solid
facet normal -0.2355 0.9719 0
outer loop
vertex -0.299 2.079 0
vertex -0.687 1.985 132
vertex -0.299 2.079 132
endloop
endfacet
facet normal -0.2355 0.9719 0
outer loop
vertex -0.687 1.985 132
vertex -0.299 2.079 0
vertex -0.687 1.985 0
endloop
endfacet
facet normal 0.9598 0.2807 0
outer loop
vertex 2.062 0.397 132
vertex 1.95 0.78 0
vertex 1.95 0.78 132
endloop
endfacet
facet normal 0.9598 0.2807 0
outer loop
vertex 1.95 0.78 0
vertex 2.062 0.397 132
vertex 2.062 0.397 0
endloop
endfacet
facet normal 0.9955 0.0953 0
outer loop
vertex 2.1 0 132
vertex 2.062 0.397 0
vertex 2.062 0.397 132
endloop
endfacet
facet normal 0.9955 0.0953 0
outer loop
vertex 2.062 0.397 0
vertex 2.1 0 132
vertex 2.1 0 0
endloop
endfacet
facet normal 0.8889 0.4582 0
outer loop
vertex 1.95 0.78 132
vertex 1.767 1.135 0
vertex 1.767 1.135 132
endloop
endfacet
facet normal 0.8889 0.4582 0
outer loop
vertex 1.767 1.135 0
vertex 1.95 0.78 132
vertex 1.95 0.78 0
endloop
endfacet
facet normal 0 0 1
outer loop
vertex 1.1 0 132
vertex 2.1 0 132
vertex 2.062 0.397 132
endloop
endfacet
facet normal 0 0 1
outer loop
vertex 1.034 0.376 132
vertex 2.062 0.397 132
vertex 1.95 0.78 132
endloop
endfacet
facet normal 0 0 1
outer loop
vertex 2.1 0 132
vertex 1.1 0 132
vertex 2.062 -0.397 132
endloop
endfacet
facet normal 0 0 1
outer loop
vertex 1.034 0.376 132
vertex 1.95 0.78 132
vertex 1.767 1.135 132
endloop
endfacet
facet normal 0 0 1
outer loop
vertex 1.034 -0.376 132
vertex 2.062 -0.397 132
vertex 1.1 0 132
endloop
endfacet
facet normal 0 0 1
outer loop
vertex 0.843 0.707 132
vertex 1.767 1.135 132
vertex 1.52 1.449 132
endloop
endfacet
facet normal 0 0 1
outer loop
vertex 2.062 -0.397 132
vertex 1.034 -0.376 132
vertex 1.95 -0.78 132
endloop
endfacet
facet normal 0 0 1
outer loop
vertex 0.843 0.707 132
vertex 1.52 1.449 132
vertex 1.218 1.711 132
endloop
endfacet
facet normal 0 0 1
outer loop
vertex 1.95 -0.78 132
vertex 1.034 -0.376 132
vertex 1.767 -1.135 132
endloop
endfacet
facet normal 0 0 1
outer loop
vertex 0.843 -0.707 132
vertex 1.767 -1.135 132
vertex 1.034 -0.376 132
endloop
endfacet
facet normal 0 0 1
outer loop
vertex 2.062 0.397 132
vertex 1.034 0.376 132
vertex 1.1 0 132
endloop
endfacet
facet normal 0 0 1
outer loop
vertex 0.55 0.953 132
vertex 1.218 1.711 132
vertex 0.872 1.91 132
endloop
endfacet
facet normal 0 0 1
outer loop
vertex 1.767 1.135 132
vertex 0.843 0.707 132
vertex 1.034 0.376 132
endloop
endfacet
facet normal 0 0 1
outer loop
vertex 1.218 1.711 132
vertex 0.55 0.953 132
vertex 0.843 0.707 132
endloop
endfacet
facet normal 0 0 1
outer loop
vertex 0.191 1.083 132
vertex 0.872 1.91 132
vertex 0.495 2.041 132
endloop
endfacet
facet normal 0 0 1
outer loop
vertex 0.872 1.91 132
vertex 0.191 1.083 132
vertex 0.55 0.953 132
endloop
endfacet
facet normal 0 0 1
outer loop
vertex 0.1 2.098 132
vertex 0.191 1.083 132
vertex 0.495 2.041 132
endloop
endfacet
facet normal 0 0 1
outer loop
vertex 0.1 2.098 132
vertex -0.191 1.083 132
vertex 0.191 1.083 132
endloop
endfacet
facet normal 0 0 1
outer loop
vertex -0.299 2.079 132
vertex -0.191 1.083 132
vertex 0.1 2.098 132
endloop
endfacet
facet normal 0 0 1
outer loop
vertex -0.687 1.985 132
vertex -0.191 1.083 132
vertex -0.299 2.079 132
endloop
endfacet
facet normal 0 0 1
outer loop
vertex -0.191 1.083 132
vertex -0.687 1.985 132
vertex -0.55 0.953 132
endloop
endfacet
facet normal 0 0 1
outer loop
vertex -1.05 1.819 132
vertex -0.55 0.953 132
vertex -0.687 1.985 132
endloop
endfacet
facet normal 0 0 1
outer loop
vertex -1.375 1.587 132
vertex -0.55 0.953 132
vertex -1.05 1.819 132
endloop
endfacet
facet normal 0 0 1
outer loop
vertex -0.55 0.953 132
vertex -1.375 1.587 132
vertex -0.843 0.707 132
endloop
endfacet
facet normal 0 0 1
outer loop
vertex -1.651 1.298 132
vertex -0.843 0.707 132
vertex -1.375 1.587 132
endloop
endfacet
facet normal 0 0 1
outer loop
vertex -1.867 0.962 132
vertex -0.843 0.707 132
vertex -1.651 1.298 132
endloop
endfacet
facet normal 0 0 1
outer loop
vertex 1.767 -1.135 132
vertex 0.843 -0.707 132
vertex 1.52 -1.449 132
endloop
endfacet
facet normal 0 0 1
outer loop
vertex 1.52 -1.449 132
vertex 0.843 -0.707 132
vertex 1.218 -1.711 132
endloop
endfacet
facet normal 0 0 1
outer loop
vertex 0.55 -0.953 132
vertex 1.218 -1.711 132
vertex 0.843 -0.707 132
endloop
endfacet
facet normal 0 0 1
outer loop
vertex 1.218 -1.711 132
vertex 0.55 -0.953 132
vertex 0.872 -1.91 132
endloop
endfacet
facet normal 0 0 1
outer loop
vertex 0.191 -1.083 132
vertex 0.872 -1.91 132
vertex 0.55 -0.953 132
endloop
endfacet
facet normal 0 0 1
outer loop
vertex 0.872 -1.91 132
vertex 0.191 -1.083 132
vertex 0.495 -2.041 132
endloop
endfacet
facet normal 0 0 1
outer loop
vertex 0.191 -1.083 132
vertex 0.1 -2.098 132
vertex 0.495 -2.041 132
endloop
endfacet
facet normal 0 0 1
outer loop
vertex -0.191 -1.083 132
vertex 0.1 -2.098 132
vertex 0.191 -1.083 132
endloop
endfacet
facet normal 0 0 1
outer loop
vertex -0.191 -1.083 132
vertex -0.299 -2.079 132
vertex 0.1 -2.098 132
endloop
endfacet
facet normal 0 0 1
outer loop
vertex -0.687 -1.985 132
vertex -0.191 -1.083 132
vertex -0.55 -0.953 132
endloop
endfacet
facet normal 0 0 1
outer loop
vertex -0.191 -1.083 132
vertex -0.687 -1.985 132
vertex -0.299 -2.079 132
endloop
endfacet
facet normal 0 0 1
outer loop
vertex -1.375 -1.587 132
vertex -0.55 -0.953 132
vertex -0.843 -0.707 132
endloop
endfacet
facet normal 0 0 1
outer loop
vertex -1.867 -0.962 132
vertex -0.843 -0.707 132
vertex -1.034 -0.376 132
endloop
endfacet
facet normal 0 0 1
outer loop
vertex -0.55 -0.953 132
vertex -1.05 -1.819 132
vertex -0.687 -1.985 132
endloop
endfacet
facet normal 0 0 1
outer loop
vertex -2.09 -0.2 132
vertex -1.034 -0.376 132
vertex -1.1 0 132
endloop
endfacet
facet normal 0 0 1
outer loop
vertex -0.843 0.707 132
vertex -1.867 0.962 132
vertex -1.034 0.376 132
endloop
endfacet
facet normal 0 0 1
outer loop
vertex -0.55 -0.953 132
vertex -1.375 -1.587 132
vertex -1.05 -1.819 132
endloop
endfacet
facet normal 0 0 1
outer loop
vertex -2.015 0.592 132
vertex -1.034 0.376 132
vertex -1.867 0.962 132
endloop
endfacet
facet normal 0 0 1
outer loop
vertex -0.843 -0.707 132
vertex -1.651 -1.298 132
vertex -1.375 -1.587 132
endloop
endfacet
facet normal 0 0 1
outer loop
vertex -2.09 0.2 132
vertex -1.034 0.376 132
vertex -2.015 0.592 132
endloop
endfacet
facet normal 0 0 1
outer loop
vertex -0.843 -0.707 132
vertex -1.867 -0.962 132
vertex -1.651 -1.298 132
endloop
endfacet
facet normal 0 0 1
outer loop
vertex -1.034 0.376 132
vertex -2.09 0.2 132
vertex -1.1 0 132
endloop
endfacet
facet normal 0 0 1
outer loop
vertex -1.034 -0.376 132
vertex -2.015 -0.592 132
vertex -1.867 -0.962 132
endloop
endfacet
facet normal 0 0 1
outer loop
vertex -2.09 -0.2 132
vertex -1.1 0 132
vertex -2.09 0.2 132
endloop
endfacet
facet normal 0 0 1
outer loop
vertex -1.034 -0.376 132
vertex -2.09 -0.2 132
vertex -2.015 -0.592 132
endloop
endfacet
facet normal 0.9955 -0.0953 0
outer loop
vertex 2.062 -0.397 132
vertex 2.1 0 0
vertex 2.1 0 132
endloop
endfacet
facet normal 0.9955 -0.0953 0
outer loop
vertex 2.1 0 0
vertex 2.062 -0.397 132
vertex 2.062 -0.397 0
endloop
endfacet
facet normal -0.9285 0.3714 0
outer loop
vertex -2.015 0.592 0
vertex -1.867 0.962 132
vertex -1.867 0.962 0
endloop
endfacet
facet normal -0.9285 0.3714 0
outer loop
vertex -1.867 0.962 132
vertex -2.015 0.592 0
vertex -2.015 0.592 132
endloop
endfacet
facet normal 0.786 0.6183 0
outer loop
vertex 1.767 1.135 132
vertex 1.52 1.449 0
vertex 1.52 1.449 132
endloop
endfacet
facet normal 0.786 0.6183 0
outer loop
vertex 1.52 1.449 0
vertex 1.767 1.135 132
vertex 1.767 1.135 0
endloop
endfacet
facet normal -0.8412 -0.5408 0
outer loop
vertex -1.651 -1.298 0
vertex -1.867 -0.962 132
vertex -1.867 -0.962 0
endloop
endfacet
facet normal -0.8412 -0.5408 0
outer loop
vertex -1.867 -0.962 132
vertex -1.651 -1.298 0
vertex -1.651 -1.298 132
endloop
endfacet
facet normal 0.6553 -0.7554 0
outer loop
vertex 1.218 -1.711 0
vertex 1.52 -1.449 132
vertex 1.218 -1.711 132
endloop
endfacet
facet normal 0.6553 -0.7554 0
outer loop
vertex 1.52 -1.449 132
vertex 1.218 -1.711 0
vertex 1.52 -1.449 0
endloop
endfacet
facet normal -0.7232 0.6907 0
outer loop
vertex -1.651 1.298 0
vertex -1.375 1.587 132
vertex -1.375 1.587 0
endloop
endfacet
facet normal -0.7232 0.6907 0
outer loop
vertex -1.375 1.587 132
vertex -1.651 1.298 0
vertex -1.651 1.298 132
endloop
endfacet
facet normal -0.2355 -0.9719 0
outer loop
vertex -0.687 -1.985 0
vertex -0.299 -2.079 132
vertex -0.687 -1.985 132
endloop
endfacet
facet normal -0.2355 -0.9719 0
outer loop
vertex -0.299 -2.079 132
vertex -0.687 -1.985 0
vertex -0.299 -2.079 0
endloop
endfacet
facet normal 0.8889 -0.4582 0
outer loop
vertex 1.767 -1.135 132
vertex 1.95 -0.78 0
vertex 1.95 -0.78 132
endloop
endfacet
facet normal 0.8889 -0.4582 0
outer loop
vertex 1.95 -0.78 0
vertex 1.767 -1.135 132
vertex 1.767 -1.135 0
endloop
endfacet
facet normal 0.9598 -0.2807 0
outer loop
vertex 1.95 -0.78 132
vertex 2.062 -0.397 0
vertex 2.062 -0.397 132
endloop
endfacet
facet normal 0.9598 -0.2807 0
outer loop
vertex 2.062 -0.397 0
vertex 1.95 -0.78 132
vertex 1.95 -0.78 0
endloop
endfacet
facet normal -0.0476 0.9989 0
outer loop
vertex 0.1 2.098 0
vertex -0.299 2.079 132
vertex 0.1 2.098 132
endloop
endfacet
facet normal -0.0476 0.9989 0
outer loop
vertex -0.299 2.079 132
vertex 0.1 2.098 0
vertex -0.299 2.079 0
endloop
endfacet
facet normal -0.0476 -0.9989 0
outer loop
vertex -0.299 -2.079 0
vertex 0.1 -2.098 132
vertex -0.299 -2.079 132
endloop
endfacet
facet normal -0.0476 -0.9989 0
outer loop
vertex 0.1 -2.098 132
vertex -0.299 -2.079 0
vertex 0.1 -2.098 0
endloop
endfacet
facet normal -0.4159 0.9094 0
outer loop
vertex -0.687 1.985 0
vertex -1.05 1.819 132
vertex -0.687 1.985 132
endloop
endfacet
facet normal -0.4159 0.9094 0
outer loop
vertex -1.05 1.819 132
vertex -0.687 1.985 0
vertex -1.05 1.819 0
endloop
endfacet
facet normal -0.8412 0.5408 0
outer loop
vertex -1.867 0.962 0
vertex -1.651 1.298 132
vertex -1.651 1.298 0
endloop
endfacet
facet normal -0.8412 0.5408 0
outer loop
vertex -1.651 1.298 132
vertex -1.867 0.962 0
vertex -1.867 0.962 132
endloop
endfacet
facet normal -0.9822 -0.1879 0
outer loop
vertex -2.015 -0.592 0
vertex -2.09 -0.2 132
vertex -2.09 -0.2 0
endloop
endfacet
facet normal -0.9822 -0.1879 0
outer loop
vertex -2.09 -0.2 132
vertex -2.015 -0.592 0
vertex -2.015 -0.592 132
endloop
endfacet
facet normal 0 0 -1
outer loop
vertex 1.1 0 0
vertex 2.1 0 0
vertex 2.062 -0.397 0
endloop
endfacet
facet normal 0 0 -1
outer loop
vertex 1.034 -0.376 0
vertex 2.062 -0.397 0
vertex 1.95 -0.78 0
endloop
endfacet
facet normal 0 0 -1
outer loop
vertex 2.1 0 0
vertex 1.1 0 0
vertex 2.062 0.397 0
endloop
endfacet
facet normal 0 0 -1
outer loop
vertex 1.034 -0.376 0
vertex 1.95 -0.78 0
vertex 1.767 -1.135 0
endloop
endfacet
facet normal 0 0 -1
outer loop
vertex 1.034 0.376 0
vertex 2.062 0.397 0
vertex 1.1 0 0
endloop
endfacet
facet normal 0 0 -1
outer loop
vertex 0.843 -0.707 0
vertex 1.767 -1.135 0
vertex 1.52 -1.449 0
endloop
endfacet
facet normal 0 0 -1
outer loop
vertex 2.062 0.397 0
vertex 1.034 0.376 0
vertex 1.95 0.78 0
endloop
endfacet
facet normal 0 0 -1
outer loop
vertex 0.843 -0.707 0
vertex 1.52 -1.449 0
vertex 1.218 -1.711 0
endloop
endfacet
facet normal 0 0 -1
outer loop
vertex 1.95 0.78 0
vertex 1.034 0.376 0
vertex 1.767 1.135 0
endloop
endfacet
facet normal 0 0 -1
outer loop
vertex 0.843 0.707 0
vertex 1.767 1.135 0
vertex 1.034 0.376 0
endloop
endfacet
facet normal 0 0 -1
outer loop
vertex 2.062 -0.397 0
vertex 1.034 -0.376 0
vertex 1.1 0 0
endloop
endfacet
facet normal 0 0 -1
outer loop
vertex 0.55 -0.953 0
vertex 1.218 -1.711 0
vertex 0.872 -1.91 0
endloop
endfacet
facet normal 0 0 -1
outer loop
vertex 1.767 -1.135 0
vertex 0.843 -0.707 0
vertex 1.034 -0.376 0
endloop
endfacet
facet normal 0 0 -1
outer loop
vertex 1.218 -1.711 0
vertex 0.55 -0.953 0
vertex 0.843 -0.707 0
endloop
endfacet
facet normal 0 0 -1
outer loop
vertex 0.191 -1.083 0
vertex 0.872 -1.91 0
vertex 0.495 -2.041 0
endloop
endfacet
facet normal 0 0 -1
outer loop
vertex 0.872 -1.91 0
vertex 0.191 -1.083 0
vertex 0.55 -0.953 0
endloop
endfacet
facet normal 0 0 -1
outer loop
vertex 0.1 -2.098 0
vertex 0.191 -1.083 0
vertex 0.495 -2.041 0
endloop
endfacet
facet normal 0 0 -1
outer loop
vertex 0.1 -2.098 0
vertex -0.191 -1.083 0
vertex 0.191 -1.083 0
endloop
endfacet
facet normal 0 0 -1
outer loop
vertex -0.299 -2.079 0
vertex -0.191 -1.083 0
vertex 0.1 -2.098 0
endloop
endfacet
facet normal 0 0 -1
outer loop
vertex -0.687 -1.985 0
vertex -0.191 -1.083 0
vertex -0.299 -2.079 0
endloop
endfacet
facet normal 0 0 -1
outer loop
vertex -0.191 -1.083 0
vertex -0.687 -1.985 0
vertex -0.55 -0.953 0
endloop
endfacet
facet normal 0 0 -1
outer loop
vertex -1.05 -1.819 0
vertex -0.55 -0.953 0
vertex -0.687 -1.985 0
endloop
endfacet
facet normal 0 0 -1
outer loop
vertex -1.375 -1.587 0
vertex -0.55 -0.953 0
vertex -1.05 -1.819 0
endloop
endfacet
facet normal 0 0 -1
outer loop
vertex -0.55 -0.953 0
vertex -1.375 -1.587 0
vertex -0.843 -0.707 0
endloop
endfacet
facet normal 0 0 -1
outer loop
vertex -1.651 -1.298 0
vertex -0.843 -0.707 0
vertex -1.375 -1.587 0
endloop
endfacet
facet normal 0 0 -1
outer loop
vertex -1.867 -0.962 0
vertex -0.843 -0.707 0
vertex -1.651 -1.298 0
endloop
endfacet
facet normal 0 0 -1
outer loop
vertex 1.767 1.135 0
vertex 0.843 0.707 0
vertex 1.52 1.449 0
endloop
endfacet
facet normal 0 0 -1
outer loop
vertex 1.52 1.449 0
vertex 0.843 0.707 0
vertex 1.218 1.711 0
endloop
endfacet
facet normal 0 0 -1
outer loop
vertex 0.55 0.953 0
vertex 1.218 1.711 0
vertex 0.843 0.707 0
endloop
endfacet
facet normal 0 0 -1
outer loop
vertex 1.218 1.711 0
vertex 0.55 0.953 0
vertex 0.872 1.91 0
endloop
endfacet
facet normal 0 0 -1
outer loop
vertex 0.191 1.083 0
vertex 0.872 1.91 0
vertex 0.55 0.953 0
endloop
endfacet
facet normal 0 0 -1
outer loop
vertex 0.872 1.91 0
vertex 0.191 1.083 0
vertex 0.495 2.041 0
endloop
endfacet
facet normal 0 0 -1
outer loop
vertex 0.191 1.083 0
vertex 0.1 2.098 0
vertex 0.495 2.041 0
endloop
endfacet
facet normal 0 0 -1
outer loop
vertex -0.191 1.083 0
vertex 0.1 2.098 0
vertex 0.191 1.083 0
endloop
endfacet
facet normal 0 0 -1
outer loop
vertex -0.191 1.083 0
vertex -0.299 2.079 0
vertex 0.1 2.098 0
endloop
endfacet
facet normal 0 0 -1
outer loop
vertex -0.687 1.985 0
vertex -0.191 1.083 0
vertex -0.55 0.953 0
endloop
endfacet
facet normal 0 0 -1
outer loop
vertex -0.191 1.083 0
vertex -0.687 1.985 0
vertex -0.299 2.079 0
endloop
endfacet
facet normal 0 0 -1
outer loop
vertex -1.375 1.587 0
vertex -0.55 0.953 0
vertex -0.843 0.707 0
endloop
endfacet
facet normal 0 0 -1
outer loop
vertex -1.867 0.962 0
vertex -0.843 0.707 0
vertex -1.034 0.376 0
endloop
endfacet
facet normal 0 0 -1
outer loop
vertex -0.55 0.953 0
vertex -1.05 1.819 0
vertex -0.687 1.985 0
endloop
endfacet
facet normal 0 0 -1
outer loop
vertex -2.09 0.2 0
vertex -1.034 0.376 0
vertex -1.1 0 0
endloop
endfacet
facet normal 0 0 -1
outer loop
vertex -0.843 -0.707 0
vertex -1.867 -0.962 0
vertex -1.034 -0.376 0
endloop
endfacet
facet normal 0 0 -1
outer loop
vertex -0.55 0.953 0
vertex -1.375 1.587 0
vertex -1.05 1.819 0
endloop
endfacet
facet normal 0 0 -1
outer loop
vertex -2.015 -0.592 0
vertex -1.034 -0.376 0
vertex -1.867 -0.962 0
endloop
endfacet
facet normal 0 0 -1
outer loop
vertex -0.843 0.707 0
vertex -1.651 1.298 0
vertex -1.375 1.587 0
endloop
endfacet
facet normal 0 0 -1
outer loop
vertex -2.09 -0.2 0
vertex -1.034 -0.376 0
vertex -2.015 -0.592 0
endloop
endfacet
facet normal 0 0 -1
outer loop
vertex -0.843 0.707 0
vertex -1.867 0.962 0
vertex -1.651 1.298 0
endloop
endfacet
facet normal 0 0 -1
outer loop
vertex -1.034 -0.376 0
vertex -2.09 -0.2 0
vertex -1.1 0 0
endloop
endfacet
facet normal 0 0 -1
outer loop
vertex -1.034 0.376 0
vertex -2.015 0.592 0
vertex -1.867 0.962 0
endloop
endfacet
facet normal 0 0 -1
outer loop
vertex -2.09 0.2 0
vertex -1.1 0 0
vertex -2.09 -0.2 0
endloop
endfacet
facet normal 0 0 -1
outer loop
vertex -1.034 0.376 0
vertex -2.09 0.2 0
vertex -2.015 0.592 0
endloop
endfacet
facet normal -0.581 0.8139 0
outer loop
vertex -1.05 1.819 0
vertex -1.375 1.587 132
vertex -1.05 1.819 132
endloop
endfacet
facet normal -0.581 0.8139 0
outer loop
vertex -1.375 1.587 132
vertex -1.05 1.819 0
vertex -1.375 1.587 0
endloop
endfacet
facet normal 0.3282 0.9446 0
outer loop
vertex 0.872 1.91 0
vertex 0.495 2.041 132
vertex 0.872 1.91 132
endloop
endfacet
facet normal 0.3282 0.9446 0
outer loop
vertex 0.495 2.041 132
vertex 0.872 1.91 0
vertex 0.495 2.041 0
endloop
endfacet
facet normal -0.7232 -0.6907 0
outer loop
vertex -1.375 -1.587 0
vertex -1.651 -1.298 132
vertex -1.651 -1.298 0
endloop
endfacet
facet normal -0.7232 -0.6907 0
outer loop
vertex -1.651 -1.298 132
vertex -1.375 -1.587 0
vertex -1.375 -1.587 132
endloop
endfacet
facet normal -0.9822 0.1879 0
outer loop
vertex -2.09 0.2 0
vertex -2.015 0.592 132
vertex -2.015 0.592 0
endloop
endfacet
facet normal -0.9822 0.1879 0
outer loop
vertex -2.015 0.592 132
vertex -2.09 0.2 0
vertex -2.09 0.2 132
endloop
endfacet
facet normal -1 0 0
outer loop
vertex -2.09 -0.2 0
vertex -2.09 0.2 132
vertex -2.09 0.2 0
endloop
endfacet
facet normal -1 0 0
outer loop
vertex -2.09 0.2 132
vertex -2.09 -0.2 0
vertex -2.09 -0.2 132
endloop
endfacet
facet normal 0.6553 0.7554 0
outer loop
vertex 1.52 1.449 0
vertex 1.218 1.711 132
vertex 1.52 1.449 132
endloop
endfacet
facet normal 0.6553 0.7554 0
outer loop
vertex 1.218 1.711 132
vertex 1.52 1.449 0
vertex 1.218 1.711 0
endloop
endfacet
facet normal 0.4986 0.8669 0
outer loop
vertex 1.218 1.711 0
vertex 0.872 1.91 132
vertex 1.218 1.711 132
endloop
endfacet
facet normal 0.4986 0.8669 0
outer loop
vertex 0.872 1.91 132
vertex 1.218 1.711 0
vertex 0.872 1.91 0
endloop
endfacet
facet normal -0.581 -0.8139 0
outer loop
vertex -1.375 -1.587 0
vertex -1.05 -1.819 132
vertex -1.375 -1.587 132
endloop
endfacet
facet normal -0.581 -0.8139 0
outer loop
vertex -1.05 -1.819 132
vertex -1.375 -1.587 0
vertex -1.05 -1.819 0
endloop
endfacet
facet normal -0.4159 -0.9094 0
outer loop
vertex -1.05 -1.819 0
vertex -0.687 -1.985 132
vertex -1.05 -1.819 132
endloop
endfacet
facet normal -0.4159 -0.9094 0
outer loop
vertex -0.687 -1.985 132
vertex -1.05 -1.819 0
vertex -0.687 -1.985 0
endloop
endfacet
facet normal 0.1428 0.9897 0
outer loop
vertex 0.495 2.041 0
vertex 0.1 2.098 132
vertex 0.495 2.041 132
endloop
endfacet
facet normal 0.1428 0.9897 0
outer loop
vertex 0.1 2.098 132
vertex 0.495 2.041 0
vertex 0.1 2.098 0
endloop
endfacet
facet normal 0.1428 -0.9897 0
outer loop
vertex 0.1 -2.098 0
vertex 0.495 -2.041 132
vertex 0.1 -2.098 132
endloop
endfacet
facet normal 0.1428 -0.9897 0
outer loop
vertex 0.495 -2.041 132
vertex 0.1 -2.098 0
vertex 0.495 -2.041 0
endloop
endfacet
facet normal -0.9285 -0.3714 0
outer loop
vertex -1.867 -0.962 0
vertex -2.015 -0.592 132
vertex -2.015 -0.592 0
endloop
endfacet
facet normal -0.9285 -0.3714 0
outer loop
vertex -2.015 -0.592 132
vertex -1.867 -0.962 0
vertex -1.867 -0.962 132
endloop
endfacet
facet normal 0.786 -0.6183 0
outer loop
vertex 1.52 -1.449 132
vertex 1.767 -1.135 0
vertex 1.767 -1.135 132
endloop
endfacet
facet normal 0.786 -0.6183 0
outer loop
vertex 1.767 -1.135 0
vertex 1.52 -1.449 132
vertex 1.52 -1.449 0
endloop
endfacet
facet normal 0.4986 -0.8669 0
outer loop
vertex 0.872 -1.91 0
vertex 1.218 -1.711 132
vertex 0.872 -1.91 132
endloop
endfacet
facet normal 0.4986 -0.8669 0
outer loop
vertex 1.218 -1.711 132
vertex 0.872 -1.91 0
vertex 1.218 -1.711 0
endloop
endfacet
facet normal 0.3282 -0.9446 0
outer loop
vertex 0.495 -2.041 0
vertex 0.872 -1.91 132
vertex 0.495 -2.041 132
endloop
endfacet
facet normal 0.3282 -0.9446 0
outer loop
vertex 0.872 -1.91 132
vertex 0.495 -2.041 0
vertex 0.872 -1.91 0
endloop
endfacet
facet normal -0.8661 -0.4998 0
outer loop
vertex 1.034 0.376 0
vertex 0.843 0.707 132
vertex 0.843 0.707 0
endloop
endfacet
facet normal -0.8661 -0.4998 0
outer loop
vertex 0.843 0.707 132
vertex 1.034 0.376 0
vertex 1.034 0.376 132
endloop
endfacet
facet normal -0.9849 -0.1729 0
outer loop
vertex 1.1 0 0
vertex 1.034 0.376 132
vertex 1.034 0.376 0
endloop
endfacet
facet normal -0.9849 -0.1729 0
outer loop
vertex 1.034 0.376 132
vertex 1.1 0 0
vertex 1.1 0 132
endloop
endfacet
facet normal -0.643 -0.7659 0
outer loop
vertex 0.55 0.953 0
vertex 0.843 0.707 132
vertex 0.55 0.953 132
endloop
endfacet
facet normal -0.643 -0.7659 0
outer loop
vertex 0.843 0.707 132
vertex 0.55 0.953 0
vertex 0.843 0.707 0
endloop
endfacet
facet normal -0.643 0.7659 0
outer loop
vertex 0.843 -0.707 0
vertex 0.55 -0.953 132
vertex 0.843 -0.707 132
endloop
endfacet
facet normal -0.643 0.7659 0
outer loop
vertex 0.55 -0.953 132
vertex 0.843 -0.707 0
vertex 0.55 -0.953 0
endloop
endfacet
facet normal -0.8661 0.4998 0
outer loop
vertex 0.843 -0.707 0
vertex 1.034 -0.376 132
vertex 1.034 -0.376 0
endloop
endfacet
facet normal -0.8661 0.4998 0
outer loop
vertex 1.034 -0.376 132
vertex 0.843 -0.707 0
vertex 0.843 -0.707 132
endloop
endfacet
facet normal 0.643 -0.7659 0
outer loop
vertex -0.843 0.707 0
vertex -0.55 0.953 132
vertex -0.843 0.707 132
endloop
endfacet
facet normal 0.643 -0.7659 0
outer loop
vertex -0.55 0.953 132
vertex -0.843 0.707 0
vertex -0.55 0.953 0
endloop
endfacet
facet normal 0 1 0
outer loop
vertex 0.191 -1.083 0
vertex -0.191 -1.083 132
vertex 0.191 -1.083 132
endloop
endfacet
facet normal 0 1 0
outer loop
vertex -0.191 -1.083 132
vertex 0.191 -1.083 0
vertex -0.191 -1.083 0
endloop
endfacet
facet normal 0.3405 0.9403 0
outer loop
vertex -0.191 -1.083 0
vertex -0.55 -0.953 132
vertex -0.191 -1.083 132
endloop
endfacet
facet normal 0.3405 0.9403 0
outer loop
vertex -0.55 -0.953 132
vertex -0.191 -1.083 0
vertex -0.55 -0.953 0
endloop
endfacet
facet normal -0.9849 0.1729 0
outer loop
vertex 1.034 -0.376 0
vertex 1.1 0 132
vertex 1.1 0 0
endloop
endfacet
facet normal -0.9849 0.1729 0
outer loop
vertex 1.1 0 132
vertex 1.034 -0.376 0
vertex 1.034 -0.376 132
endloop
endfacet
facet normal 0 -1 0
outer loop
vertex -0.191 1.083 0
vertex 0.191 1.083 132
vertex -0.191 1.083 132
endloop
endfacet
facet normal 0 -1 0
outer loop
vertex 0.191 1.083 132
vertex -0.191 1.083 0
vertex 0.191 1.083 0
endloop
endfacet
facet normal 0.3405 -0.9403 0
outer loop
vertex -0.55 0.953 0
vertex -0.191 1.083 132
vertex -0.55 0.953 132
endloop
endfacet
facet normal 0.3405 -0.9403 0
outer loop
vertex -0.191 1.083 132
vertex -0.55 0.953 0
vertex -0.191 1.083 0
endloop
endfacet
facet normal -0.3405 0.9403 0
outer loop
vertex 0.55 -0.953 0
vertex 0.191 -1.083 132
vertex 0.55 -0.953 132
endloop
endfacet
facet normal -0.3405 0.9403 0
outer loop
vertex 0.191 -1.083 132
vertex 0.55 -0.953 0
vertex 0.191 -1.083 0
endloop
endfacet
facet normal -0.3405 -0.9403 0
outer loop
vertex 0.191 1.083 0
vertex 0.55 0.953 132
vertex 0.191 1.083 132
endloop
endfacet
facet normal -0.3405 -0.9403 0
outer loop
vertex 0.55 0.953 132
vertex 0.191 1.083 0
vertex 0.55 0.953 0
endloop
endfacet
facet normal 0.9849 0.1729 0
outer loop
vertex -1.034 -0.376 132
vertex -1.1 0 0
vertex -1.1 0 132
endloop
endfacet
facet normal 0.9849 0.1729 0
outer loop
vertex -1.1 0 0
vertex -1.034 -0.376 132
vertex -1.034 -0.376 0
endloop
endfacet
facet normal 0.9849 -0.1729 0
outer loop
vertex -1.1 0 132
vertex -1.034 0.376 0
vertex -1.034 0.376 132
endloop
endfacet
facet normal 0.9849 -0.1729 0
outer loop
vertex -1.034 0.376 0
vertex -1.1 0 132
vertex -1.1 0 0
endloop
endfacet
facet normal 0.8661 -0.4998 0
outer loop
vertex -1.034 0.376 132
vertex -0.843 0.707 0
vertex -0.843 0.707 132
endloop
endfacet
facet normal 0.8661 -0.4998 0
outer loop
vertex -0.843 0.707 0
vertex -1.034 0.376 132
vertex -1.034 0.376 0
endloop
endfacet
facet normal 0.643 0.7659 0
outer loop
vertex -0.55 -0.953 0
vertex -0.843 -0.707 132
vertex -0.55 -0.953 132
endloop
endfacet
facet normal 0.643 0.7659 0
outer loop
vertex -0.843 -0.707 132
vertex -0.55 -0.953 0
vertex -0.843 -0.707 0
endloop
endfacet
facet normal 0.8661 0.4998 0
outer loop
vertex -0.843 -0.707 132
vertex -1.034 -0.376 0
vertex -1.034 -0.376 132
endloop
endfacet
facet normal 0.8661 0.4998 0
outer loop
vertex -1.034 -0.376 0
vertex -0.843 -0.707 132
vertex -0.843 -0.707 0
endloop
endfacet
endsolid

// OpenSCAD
$fa = 1;
$fs = 0.4;

bottle_height=195;
pipe_height=132;
pipe_thickness=4.2;
pipe_wall=1;

difference() {
    cylinder(h=pipe_height, d=pipe_thickness);
    translate([0,0,-1])
    cylinder(h=pipe_height+2, d=pipe_thickness - 2*pipe_wall);
}
